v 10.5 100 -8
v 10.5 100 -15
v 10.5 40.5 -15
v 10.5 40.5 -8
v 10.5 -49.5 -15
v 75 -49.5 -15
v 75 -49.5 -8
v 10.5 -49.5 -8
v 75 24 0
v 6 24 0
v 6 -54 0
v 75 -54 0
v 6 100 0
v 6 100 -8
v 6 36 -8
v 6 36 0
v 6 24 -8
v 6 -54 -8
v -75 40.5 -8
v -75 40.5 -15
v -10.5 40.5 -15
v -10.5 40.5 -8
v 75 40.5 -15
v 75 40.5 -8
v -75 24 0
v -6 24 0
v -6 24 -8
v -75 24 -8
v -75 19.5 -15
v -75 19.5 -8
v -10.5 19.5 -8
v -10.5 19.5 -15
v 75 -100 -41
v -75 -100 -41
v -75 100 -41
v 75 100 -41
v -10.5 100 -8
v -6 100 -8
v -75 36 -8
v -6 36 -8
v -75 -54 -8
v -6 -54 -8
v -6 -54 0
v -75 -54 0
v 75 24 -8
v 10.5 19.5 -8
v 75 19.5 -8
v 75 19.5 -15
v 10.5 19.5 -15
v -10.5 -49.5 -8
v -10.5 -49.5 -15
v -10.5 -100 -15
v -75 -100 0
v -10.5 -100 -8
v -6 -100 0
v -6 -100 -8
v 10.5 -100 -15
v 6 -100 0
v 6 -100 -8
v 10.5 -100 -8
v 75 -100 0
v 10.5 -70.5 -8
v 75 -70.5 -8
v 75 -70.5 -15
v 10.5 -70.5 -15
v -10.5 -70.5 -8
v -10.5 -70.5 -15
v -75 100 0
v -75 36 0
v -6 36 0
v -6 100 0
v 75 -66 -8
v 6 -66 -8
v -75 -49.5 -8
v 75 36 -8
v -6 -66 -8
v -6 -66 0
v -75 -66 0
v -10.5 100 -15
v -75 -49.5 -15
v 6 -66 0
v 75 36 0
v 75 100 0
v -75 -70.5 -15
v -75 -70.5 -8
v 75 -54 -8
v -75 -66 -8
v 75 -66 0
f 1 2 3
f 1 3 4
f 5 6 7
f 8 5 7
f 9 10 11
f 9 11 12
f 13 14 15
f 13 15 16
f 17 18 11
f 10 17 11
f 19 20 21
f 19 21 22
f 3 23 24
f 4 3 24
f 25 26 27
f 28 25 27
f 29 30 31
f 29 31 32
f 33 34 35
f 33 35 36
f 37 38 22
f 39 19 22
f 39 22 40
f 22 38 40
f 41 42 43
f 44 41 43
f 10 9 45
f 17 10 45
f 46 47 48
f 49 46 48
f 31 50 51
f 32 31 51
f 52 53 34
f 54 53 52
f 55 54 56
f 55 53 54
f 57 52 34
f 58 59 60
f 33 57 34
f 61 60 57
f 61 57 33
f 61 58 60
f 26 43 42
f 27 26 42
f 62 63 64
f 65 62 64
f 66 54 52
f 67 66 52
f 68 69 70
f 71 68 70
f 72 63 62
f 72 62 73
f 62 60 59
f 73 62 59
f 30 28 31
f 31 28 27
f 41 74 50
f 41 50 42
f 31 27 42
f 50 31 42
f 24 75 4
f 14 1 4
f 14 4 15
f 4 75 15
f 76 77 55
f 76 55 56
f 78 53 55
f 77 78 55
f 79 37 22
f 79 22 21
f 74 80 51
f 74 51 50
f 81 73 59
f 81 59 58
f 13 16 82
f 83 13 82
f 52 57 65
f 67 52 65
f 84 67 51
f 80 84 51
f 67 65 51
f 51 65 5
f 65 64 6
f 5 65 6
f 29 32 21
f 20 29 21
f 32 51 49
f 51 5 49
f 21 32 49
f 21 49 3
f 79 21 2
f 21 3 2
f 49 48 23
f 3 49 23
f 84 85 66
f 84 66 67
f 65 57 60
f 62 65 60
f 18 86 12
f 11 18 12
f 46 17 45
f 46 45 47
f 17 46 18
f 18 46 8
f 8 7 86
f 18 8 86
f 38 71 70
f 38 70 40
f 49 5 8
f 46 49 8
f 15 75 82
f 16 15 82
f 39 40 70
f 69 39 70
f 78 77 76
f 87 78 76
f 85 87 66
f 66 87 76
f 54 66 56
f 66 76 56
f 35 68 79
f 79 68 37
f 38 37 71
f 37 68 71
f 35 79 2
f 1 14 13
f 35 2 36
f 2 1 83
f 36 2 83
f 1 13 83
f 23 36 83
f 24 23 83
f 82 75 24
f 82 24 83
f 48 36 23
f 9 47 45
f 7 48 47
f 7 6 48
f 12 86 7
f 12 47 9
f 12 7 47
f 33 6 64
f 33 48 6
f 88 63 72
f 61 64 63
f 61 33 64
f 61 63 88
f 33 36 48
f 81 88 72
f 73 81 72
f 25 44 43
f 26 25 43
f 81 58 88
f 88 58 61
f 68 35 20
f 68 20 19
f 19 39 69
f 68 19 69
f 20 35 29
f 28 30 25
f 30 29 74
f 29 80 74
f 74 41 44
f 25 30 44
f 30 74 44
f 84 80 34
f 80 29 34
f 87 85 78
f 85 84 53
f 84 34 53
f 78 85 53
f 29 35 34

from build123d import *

# Parameters (mm, degrees)
F0_W     = 150
F0_H     = 41
F1_DEPTH = 100
F3_DEPTH = 200.001
F5_DEPTH = 150.001


with BuildPart() as f1:
    # F0 (on Front) → F1 (new body, symmetric)
    with BuildSketch(Plane.XZ):
        with Locations((0, -20.5)):
            Rectangle(F0_W, F0_H)
    extrude(amount=F1_DEPTH, both=True)

    # F2 (on face) → F3 (cut, through all)
    with BuildSketch(Plane.XZ.offset(100)):
        Polygon((6, 0), (-6, 0), (-6, -8), (-10.5, -8), (-10.5, -15), (10.5, -15), (10.5, -8), (6, -8), align=None)
    extrude(amount=-F3_DEPTH, mode=Mode.SUBTRACT)

    # F4 (on face) → F5 (cut, through all)
    with BuildSketch(Plane.YZ.offset(75)):
        Polygon((-54, 0), (-66, 0), (-66, -8), (-70.5, -8), (-70.5, -15), (-49.5, -15), (-49.5, -8), (-54, -8), align=None)
        Polygon((36, 0), (24, 0), (24, -8), (19.5, -8), (19.5, -15), (40.5, -15), (40.5, -8), (36, -8), align=None)
    extrude(amount=-F5_DEPTH, mode=Mode.SUBTRACT)


solid = f1.part
